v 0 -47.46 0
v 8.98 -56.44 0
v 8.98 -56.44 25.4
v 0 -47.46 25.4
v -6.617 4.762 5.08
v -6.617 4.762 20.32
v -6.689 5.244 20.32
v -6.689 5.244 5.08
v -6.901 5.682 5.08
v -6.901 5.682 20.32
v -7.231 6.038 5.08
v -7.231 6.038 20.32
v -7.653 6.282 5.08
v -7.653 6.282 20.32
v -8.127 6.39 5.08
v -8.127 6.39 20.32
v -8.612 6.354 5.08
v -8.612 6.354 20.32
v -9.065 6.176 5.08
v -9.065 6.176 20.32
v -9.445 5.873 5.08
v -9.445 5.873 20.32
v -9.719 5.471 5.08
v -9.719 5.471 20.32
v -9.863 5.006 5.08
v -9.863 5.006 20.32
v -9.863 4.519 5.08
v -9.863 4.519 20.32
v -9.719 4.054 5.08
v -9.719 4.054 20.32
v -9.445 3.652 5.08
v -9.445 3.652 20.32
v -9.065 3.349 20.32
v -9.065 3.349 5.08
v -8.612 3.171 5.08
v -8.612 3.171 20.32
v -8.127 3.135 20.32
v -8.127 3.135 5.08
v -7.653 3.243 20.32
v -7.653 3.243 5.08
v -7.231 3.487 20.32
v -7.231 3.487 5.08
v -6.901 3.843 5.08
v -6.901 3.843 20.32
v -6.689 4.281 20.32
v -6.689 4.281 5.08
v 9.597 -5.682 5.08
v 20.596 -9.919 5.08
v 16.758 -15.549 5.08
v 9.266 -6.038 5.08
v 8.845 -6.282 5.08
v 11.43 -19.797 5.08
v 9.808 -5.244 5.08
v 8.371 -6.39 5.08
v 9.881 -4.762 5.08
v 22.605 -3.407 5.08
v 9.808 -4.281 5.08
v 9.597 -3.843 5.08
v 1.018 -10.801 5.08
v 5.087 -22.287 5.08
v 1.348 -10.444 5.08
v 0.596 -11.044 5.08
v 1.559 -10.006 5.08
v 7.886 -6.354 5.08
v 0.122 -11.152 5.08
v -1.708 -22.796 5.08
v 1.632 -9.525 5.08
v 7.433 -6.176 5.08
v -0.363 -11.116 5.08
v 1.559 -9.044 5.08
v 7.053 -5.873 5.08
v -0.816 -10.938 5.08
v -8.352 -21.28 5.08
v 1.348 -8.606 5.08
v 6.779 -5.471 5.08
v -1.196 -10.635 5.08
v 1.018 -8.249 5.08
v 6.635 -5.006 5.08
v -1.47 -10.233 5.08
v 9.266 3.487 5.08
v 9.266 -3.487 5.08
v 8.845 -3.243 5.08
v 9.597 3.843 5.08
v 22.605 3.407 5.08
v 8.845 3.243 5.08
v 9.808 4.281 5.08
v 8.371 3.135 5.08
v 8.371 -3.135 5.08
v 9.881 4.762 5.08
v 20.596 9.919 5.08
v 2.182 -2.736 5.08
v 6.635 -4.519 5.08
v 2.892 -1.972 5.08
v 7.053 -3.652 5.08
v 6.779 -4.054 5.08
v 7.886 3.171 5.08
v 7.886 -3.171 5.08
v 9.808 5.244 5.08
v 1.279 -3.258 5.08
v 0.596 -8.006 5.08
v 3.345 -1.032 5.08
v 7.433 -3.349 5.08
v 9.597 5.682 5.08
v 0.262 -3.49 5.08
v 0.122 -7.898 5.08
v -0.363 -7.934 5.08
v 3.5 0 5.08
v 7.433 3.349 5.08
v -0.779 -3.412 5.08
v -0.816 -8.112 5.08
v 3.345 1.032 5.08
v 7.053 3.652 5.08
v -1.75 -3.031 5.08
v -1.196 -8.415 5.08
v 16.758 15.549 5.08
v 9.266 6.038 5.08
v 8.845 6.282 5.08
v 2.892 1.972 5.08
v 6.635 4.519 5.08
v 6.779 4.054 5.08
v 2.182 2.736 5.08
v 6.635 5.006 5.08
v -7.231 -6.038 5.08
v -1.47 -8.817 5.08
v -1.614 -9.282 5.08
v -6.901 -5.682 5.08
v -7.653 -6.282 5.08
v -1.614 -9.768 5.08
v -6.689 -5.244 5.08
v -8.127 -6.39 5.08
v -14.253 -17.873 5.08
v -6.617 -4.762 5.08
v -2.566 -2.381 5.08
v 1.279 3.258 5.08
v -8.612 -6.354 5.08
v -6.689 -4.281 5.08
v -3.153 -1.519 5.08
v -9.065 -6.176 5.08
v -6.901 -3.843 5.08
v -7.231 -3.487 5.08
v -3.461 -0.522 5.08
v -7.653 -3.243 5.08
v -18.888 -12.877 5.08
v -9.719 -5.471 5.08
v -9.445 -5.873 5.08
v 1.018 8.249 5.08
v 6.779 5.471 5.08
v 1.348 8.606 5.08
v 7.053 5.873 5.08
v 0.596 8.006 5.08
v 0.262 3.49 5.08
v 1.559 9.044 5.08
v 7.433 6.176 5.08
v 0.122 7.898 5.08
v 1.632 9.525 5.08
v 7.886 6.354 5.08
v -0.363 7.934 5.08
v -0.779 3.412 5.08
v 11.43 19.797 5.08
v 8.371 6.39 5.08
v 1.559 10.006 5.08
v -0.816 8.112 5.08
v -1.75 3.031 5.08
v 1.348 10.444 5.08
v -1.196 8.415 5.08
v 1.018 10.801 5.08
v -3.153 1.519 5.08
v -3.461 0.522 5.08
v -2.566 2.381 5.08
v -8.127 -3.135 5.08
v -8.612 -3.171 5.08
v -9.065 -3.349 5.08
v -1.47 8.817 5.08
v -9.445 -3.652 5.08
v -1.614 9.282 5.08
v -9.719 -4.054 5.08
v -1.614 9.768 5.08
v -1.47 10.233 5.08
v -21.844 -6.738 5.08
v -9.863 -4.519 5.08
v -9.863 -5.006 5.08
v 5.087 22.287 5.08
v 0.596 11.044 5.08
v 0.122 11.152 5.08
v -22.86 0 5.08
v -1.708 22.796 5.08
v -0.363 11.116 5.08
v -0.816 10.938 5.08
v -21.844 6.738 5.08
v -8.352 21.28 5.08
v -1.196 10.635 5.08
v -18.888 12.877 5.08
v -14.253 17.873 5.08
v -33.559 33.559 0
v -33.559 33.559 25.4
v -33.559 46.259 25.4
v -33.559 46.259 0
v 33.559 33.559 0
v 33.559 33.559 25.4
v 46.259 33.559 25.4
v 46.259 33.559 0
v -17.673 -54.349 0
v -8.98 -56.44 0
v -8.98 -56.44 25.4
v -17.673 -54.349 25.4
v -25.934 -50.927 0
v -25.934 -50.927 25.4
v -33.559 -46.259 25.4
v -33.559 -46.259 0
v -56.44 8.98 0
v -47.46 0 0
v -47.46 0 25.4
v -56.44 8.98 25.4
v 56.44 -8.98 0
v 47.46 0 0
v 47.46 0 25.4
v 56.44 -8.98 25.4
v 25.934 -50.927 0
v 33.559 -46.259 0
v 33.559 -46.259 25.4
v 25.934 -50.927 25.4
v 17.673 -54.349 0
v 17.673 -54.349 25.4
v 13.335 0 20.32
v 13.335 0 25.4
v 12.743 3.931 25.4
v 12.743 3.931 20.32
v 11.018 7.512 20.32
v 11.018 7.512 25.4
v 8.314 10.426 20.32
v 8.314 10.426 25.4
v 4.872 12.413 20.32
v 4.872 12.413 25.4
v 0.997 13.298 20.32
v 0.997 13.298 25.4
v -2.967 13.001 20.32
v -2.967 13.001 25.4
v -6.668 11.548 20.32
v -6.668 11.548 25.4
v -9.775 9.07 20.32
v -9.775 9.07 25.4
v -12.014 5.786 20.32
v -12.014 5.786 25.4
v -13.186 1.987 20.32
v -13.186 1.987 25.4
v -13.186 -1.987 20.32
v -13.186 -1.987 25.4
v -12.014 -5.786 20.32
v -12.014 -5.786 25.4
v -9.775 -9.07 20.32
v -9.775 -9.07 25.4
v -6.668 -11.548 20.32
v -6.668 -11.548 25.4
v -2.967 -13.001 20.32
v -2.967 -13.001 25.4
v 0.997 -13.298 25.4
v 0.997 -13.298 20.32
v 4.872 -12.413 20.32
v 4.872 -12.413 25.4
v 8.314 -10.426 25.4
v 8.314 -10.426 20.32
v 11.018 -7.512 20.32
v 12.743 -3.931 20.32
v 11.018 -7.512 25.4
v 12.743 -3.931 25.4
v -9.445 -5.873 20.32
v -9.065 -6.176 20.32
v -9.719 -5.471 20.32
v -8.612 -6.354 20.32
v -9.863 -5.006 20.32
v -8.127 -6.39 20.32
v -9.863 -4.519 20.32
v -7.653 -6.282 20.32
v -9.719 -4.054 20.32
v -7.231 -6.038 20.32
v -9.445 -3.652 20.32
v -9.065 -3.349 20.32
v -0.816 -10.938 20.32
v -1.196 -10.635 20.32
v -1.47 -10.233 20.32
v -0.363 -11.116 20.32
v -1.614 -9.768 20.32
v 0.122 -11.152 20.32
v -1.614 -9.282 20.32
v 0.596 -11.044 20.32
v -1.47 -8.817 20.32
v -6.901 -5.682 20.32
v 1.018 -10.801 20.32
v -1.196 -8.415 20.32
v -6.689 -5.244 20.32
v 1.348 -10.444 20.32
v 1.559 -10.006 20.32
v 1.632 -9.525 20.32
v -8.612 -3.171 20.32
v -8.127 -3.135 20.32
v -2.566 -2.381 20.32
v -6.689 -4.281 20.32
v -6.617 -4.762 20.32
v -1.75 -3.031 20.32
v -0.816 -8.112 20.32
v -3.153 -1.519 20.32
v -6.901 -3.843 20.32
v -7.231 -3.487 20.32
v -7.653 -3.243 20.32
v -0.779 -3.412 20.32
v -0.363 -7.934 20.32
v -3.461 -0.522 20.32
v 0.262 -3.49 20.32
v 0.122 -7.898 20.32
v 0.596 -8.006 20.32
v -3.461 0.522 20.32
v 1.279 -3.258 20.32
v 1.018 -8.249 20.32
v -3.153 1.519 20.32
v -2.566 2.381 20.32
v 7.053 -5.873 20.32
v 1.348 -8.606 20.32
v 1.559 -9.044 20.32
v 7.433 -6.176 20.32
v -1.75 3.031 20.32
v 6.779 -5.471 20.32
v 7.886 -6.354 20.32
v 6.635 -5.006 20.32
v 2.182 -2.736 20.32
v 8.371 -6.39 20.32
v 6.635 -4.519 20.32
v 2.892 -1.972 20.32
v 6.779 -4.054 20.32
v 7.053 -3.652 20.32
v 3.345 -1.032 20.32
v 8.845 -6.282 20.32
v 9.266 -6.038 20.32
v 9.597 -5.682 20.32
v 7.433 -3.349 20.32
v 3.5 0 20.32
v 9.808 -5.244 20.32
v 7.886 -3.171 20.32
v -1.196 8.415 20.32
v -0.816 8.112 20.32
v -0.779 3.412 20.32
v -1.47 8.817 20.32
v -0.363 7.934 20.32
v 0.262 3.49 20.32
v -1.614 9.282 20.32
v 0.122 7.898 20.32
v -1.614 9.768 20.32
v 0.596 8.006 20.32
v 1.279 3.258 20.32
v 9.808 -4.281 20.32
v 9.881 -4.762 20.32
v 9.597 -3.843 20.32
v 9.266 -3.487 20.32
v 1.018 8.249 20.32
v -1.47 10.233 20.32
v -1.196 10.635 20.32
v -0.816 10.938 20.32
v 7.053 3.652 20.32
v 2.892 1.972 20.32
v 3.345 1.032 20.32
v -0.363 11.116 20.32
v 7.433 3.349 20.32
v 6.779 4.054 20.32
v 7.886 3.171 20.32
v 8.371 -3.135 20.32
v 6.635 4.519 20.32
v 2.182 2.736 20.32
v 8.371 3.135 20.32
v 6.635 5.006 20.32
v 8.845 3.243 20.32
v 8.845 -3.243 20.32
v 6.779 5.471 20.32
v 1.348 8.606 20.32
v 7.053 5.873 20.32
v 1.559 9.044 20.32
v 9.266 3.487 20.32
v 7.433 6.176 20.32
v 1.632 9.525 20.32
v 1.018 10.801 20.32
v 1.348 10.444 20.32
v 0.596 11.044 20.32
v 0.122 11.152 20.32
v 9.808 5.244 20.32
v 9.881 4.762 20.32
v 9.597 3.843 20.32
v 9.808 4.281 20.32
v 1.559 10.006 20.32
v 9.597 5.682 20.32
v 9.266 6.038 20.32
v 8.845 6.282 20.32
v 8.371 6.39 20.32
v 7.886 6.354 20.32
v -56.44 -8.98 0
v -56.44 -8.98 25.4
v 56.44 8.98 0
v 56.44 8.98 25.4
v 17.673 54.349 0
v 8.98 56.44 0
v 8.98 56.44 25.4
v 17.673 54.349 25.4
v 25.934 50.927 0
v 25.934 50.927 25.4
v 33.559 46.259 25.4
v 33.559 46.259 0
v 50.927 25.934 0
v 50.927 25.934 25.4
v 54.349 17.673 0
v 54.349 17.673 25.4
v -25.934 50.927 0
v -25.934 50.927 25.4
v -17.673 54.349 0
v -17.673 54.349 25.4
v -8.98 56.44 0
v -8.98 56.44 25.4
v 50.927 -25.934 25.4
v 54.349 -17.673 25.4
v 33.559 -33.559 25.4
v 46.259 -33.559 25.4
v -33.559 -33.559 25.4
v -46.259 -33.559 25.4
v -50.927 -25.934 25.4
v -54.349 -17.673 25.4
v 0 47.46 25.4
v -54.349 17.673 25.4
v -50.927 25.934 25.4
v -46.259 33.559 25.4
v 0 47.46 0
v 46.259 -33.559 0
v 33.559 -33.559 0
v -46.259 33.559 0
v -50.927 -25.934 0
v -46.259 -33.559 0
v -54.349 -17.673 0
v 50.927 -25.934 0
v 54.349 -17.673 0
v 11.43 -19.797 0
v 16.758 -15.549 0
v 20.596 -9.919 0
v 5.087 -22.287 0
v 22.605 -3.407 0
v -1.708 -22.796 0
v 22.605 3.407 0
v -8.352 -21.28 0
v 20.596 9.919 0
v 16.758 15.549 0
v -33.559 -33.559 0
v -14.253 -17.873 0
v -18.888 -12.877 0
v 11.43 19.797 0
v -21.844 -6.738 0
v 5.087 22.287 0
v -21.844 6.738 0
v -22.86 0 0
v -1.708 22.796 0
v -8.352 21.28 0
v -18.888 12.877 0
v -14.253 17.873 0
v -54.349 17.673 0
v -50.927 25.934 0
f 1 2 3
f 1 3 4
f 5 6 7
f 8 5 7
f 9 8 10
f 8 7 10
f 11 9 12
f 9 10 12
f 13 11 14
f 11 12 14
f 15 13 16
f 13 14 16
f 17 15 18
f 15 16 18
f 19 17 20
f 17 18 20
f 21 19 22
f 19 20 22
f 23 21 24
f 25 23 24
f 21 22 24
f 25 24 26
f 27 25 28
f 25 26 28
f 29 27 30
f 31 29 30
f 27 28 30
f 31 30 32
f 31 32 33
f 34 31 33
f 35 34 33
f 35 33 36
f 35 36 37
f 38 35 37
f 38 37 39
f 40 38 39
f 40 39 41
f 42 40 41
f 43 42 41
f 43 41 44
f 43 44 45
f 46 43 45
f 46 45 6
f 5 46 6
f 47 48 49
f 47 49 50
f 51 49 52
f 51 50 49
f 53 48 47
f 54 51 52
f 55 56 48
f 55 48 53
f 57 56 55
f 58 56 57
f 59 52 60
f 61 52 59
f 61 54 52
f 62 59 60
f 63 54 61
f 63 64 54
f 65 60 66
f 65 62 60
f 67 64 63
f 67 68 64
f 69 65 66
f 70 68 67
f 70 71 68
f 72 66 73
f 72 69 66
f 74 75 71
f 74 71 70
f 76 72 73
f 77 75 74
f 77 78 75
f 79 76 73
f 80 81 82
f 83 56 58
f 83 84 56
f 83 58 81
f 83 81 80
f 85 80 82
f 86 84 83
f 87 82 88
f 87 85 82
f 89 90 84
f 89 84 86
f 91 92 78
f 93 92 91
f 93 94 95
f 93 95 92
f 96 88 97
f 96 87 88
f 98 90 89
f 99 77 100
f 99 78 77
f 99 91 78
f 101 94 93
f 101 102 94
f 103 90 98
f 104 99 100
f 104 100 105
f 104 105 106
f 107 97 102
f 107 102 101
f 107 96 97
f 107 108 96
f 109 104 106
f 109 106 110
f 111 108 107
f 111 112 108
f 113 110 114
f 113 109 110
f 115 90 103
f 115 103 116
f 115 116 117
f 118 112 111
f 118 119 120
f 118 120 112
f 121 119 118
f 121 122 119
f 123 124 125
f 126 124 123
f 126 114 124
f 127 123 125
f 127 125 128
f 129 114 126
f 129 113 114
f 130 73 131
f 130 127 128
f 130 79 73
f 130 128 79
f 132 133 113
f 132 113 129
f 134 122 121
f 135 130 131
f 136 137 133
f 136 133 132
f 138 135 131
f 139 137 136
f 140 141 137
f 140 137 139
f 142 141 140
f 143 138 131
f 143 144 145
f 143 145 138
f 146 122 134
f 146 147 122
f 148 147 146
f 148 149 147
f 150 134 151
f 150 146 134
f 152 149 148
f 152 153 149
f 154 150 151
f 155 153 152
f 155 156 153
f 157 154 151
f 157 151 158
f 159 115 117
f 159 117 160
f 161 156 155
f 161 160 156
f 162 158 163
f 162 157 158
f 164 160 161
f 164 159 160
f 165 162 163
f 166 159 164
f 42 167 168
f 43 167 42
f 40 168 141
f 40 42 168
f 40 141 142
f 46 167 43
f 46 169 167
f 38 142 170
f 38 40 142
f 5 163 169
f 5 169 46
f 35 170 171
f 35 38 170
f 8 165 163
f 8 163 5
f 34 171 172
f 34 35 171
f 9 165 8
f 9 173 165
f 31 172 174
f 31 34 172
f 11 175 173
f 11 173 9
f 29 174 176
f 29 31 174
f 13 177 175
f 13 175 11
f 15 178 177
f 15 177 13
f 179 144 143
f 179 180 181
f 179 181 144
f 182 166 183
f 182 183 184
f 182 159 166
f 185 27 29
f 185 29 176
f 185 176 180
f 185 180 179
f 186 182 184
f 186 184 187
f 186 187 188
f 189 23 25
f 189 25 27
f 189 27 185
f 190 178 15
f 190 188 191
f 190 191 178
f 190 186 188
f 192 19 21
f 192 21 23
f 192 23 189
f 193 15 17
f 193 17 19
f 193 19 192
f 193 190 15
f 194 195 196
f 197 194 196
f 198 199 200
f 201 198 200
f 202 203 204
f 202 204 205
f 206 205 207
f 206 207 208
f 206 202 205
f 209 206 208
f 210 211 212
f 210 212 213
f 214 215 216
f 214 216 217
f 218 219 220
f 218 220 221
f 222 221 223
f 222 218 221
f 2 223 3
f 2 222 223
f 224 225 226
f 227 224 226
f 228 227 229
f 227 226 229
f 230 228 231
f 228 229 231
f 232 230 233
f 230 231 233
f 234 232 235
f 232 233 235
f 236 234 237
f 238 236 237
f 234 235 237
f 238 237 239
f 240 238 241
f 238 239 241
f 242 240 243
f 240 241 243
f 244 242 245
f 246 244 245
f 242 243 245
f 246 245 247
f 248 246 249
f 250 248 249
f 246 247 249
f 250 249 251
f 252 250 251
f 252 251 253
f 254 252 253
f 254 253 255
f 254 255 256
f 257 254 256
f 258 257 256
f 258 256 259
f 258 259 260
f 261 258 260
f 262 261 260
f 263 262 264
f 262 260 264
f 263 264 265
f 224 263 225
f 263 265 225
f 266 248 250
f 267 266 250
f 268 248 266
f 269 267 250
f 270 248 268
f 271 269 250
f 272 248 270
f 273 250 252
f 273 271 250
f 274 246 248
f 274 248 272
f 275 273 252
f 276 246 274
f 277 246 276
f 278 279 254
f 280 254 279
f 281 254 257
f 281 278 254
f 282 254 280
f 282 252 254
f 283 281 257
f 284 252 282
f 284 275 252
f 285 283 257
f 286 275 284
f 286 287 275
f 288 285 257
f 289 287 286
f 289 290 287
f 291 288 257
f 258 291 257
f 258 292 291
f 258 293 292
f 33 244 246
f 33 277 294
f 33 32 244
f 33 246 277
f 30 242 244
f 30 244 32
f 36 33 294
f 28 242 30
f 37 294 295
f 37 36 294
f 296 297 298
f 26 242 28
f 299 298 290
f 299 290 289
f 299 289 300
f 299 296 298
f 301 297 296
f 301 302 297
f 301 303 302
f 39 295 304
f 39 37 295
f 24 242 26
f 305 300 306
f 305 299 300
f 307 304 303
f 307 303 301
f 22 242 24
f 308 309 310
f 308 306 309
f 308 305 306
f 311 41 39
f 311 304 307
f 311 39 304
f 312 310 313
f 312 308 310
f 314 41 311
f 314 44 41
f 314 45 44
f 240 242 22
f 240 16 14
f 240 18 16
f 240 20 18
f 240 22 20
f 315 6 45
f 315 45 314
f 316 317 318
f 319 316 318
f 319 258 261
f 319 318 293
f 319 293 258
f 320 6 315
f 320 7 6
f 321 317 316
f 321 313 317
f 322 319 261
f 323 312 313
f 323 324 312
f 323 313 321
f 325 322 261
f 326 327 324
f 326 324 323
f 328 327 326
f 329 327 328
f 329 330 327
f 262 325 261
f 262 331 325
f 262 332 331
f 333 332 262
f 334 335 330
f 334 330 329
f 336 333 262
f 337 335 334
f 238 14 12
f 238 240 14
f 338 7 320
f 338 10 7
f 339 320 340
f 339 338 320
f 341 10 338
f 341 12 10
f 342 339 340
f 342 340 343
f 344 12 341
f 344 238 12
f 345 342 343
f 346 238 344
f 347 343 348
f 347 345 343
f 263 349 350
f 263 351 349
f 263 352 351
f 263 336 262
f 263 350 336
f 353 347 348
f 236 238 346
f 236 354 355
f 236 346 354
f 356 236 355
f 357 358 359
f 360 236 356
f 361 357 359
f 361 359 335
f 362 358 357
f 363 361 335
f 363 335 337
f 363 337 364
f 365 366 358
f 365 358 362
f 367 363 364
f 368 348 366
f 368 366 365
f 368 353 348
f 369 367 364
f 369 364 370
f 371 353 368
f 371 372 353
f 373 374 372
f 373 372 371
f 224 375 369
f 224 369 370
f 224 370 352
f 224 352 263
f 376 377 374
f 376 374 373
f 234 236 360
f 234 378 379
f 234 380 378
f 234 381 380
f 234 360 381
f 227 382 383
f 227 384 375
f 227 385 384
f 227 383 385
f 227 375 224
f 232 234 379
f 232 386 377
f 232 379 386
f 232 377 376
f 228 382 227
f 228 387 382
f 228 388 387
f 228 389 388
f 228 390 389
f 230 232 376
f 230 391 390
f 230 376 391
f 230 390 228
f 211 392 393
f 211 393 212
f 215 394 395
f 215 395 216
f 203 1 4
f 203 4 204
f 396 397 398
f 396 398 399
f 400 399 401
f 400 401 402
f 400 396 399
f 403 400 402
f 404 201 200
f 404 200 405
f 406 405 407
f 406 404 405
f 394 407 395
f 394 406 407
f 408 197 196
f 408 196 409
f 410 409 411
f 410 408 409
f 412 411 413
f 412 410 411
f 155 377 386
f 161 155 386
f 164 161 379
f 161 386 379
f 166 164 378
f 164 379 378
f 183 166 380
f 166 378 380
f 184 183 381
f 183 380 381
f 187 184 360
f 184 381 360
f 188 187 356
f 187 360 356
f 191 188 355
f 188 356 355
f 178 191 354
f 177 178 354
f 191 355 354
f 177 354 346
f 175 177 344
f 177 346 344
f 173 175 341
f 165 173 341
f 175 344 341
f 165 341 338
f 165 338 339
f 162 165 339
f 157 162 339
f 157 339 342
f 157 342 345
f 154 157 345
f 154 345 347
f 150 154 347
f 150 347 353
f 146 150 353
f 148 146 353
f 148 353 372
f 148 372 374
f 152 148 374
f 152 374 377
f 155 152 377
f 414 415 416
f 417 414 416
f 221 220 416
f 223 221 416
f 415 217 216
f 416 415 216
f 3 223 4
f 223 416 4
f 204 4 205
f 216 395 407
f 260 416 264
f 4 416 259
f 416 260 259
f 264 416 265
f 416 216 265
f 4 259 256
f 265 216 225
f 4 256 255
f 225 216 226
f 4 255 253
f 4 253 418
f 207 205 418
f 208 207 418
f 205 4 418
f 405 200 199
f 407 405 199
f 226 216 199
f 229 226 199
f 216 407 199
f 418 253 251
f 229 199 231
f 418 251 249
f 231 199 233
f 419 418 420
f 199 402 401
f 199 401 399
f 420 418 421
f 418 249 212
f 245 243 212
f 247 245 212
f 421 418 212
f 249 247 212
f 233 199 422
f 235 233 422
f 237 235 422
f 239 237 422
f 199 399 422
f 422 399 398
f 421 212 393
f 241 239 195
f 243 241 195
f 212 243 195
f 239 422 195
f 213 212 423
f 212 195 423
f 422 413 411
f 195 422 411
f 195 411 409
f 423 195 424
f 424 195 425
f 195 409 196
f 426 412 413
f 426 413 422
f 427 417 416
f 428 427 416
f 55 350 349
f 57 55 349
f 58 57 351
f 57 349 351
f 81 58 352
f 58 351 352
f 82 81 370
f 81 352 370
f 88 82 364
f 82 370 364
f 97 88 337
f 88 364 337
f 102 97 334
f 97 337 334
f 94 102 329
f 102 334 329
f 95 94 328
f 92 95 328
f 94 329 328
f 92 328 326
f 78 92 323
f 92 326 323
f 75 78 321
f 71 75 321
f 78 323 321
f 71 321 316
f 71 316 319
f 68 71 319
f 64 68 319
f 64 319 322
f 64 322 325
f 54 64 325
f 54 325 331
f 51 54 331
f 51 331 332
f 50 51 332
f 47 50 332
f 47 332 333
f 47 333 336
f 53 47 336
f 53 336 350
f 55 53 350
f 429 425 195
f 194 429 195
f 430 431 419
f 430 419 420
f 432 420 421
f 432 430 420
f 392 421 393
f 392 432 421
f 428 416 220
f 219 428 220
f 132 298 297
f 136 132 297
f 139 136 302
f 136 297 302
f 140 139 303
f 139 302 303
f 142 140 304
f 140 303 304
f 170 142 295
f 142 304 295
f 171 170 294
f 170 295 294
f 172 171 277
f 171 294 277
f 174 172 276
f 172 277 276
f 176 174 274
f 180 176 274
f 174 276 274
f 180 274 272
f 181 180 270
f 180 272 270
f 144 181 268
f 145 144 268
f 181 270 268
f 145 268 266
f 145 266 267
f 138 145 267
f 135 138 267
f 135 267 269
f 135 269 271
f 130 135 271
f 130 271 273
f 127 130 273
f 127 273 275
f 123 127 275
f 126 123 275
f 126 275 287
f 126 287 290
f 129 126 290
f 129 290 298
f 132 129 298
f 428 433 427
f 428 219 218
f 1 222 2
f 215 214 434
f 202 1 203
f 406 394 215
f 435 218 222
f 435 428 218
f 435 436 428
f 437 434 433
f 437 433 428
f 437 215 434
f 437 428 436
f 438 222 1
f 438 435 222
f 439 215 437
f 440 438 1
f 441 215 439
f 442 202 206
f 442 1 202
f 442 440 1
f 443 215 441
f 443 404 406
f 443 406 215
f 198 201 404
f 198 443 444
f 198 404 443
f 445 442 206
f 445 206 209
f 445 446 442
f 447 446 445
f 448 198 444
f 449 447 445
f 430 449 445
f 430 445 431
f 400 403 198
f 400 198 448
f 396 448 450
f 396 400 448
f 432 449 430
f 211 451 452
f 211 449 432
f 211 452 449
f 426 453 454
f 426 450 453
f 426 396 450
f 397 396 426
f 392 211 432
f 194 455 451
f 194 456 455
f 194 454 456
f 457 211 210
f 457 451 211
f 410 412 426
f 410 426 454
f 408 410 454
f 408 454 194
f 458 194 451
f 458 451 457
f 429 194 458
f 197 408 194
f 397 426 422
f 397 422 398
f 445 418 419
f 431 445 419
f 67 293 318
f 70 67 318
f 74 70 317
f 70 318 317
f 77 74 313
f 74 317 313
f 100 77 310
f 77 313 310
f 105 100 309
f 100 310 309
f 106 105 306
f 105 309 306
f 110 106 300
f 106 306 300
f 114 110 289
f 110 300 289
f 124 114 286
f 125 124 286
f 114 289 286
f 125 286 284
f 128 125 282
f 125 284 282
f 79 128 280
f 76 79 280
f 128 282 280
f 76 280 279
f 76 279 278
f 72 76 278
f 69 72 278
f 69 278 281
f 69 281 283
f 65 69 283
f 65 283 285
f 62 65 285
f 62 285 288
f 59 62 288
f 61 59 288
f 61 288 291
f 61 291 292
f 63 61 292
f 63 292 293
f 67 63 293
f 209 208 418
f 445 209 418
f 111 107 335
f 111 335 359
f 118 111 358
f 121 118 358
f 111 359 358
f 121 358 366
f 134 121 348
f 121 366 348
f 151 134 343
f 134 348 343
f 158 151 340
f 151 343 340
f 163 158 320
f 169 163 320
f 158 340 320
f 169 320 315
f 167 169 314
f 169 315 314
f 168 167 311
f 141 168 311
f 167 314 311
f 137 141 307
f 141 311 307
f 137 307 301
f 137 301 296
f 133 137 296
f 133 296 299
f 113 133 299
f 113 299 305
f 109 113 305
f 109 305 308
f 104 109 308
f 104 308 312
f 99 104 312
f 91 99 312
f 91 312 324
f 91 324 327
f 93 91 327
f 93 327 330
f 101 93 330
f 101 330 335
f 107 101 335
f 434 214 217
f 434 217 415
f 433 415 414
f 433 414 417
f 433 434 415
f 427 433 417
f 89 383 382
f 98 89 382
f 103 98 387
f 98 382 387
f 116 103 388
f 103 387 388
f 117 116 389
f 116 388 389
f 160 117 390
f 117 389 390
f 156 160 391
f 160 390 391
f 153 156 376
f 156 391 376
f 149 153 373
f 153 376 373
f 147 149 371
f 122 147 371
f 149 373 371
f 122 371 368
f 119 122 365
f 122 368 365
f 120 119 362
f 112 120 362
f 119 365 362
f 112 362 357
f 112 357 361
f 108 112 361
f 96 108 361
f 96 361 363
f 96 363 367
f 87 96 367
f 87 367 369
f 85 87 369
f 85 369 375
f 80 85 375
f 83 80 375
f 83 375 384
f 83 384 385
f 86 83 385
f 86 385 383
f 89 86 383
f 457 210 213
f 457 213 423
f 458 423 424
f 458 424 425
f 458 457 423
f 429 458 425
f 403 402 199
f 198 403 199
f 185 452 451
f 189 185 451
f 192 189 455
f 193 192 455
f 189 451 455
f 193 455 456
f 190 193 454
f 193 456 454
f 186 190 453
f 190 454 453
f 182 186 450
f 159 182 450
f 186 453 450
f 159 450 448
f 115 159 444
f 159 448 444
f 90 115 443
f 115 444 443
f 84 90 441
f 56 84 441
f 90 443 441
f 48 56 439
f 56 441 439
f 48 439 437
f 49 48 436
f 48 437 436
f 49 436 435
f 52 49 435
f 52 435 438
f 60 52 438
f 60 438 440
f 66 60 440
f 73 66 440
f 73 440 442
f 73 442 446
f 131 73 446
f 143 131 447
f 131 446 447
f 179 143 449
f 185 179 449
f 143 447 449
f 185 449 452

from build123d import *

# Parameters (mm, degrees)
BOSS_EXTRUDE1_DEPTH   = 25.4
SKETCH2_R             = 3.5
CUT_EXTRUDE1_DEPTH    = 84.762252835
SKETCH3_R             = 13.335
CUT_EXTRUDE2_DEPTH    = 5.08
SKETCH4_R             = 22.86
CUT_EXTRUDE3_DEPTH    = 5.08
F_4_CLEARANCE_HOLE1_D = 3.2639


with BuildPart() as part:
    # Sketch1 → Boss-Extrude1 (new body)
    with BuildSketch(Plane.XY):
        with BuildLine():
            Line((-8.980256121, 56.44003455), (0, 47.459778429))
            Line((0, 47.459778429), (8.980256121, 56.44003455))
            ThreePointArc((8.980256121, 56.44003455), (21.87035816, 52.799715283), (33.559131161, 46.259131161))
            Line((33.559131161, 46.259131161), (33.559131161, 33.559131161))
            Line((33.559131161, 33.559131161), (46.259131161, 33.559131161))
            ThreePointArc((46.259131161, 33.559131161), (52.799715283, 21.87035816), (56.44003455, 8.980256121))
            Line((56.44003455, 8.980256121), (47.459778429, 0))
            Line((47.459778429, 0), (56.44003455, -8.980256121))
            ThreePointArc((56.44003455, -8.980256121), (52.799715283, -21.87035816), (46.259131161, -33.559131161))
            Line((46.259131161, -33.559131161), (33.559131161, -33.559131161))
            Line((33.559131161, -33.559131161), (33.559131161, -46.259131161))
            ThreePointArc((33.559131161, -46.259131161), (21.87035816, -52.799715283), (8.980256121, -56.44003455))
            Line((8.980256121, -56.44003455), (0, -47.459778429))
            Line((0, -47.459778429), (-8.980256121, -56.44003455))
            ThreePointArc((-8.980256121, -56.44003455), (-21.87035816, -52.799715283), (-33.559131161, -46.259131161))
            Line((-33.559131161, -46.259131161), (-33.559131161, -33.559131161))
            Line((-33.559131161, -33.559131161), (-46.259131161, -33.559131161))
            ThreePointArc((-46.259131161, -33.559131161), (-52.799715283, -21.87035816), (-56.44003455, -8.980256121))
            Line((-56.44003455, -8.980256121), (-47.459778429, 0))
            Line((-47.459778429, 0), (-56.44003455, 8.980256121))
            ThreePointArc((-56.44003455, 8.980256121), (-52.799715283, 21.87035816), (-46.259131161, 33.559131161))
            Line((-46.259131161, 33.559131161), (-33.559131161, 33.559131161))
            Line((-33.559131161, 33.559131161), (-33.559131161, 46.259131161))
            ThreePointArc((-33.559131161, 46.259131161), (-21.87035816, 52.799715283), (-8.980256121, 56.44003455))
        make_face()
    extrude(amount=BOSS_EXTRUDE1_DEPTH)

    # Sketch2 → Cut-Extrude1 (cut, through all)
    with BuildSketch(Plane.XY.offset(25.4)):
        Circle(SKETCH2_R)
    extrude(amount=-CUT_EXTRUDE1_DEPTH, mode=Mode.SUBTRACT)

    # Sketch3 → Cut-Extrude2 (cut)
    with BuildSketch(Plane.XY.offset(25.4)):
        Circle(SKETCH3_R)
    extrude(amount=-CUT_EXTRUDE2_DEPTH, mode=Mode.SUBTRACT)

    # Sketch4 → Cut-Extrude3 (cut)
    with BuildSketch(Plane(origin=(0, 0, 0), x_dir=(-1, 0, 0), z_dir=(0, 0, -1))):
        Circle(SKETCH4_R)
    extrude(amount=-CUT_EXTRUDE3_DEPTH, mode=Mode.SUBTRACT)

    # #4 Clearance Hole1 (through all)
    with Locations(Plane(origin=(0, 0, 5.08), x_dir=(-1, 0, 0), z_dir=(0, 0, -1))):
        with Locations((0, 9.525), (8.248891971, 4.7625), (8.248891971, -4.7625), (0, -9.525), (-8.248891971, 4.7625), (-8.248891971, -4.7625)):
            Hole(F_4_CLEARANCE_HOLE1_D / 2)


solid = part.part
